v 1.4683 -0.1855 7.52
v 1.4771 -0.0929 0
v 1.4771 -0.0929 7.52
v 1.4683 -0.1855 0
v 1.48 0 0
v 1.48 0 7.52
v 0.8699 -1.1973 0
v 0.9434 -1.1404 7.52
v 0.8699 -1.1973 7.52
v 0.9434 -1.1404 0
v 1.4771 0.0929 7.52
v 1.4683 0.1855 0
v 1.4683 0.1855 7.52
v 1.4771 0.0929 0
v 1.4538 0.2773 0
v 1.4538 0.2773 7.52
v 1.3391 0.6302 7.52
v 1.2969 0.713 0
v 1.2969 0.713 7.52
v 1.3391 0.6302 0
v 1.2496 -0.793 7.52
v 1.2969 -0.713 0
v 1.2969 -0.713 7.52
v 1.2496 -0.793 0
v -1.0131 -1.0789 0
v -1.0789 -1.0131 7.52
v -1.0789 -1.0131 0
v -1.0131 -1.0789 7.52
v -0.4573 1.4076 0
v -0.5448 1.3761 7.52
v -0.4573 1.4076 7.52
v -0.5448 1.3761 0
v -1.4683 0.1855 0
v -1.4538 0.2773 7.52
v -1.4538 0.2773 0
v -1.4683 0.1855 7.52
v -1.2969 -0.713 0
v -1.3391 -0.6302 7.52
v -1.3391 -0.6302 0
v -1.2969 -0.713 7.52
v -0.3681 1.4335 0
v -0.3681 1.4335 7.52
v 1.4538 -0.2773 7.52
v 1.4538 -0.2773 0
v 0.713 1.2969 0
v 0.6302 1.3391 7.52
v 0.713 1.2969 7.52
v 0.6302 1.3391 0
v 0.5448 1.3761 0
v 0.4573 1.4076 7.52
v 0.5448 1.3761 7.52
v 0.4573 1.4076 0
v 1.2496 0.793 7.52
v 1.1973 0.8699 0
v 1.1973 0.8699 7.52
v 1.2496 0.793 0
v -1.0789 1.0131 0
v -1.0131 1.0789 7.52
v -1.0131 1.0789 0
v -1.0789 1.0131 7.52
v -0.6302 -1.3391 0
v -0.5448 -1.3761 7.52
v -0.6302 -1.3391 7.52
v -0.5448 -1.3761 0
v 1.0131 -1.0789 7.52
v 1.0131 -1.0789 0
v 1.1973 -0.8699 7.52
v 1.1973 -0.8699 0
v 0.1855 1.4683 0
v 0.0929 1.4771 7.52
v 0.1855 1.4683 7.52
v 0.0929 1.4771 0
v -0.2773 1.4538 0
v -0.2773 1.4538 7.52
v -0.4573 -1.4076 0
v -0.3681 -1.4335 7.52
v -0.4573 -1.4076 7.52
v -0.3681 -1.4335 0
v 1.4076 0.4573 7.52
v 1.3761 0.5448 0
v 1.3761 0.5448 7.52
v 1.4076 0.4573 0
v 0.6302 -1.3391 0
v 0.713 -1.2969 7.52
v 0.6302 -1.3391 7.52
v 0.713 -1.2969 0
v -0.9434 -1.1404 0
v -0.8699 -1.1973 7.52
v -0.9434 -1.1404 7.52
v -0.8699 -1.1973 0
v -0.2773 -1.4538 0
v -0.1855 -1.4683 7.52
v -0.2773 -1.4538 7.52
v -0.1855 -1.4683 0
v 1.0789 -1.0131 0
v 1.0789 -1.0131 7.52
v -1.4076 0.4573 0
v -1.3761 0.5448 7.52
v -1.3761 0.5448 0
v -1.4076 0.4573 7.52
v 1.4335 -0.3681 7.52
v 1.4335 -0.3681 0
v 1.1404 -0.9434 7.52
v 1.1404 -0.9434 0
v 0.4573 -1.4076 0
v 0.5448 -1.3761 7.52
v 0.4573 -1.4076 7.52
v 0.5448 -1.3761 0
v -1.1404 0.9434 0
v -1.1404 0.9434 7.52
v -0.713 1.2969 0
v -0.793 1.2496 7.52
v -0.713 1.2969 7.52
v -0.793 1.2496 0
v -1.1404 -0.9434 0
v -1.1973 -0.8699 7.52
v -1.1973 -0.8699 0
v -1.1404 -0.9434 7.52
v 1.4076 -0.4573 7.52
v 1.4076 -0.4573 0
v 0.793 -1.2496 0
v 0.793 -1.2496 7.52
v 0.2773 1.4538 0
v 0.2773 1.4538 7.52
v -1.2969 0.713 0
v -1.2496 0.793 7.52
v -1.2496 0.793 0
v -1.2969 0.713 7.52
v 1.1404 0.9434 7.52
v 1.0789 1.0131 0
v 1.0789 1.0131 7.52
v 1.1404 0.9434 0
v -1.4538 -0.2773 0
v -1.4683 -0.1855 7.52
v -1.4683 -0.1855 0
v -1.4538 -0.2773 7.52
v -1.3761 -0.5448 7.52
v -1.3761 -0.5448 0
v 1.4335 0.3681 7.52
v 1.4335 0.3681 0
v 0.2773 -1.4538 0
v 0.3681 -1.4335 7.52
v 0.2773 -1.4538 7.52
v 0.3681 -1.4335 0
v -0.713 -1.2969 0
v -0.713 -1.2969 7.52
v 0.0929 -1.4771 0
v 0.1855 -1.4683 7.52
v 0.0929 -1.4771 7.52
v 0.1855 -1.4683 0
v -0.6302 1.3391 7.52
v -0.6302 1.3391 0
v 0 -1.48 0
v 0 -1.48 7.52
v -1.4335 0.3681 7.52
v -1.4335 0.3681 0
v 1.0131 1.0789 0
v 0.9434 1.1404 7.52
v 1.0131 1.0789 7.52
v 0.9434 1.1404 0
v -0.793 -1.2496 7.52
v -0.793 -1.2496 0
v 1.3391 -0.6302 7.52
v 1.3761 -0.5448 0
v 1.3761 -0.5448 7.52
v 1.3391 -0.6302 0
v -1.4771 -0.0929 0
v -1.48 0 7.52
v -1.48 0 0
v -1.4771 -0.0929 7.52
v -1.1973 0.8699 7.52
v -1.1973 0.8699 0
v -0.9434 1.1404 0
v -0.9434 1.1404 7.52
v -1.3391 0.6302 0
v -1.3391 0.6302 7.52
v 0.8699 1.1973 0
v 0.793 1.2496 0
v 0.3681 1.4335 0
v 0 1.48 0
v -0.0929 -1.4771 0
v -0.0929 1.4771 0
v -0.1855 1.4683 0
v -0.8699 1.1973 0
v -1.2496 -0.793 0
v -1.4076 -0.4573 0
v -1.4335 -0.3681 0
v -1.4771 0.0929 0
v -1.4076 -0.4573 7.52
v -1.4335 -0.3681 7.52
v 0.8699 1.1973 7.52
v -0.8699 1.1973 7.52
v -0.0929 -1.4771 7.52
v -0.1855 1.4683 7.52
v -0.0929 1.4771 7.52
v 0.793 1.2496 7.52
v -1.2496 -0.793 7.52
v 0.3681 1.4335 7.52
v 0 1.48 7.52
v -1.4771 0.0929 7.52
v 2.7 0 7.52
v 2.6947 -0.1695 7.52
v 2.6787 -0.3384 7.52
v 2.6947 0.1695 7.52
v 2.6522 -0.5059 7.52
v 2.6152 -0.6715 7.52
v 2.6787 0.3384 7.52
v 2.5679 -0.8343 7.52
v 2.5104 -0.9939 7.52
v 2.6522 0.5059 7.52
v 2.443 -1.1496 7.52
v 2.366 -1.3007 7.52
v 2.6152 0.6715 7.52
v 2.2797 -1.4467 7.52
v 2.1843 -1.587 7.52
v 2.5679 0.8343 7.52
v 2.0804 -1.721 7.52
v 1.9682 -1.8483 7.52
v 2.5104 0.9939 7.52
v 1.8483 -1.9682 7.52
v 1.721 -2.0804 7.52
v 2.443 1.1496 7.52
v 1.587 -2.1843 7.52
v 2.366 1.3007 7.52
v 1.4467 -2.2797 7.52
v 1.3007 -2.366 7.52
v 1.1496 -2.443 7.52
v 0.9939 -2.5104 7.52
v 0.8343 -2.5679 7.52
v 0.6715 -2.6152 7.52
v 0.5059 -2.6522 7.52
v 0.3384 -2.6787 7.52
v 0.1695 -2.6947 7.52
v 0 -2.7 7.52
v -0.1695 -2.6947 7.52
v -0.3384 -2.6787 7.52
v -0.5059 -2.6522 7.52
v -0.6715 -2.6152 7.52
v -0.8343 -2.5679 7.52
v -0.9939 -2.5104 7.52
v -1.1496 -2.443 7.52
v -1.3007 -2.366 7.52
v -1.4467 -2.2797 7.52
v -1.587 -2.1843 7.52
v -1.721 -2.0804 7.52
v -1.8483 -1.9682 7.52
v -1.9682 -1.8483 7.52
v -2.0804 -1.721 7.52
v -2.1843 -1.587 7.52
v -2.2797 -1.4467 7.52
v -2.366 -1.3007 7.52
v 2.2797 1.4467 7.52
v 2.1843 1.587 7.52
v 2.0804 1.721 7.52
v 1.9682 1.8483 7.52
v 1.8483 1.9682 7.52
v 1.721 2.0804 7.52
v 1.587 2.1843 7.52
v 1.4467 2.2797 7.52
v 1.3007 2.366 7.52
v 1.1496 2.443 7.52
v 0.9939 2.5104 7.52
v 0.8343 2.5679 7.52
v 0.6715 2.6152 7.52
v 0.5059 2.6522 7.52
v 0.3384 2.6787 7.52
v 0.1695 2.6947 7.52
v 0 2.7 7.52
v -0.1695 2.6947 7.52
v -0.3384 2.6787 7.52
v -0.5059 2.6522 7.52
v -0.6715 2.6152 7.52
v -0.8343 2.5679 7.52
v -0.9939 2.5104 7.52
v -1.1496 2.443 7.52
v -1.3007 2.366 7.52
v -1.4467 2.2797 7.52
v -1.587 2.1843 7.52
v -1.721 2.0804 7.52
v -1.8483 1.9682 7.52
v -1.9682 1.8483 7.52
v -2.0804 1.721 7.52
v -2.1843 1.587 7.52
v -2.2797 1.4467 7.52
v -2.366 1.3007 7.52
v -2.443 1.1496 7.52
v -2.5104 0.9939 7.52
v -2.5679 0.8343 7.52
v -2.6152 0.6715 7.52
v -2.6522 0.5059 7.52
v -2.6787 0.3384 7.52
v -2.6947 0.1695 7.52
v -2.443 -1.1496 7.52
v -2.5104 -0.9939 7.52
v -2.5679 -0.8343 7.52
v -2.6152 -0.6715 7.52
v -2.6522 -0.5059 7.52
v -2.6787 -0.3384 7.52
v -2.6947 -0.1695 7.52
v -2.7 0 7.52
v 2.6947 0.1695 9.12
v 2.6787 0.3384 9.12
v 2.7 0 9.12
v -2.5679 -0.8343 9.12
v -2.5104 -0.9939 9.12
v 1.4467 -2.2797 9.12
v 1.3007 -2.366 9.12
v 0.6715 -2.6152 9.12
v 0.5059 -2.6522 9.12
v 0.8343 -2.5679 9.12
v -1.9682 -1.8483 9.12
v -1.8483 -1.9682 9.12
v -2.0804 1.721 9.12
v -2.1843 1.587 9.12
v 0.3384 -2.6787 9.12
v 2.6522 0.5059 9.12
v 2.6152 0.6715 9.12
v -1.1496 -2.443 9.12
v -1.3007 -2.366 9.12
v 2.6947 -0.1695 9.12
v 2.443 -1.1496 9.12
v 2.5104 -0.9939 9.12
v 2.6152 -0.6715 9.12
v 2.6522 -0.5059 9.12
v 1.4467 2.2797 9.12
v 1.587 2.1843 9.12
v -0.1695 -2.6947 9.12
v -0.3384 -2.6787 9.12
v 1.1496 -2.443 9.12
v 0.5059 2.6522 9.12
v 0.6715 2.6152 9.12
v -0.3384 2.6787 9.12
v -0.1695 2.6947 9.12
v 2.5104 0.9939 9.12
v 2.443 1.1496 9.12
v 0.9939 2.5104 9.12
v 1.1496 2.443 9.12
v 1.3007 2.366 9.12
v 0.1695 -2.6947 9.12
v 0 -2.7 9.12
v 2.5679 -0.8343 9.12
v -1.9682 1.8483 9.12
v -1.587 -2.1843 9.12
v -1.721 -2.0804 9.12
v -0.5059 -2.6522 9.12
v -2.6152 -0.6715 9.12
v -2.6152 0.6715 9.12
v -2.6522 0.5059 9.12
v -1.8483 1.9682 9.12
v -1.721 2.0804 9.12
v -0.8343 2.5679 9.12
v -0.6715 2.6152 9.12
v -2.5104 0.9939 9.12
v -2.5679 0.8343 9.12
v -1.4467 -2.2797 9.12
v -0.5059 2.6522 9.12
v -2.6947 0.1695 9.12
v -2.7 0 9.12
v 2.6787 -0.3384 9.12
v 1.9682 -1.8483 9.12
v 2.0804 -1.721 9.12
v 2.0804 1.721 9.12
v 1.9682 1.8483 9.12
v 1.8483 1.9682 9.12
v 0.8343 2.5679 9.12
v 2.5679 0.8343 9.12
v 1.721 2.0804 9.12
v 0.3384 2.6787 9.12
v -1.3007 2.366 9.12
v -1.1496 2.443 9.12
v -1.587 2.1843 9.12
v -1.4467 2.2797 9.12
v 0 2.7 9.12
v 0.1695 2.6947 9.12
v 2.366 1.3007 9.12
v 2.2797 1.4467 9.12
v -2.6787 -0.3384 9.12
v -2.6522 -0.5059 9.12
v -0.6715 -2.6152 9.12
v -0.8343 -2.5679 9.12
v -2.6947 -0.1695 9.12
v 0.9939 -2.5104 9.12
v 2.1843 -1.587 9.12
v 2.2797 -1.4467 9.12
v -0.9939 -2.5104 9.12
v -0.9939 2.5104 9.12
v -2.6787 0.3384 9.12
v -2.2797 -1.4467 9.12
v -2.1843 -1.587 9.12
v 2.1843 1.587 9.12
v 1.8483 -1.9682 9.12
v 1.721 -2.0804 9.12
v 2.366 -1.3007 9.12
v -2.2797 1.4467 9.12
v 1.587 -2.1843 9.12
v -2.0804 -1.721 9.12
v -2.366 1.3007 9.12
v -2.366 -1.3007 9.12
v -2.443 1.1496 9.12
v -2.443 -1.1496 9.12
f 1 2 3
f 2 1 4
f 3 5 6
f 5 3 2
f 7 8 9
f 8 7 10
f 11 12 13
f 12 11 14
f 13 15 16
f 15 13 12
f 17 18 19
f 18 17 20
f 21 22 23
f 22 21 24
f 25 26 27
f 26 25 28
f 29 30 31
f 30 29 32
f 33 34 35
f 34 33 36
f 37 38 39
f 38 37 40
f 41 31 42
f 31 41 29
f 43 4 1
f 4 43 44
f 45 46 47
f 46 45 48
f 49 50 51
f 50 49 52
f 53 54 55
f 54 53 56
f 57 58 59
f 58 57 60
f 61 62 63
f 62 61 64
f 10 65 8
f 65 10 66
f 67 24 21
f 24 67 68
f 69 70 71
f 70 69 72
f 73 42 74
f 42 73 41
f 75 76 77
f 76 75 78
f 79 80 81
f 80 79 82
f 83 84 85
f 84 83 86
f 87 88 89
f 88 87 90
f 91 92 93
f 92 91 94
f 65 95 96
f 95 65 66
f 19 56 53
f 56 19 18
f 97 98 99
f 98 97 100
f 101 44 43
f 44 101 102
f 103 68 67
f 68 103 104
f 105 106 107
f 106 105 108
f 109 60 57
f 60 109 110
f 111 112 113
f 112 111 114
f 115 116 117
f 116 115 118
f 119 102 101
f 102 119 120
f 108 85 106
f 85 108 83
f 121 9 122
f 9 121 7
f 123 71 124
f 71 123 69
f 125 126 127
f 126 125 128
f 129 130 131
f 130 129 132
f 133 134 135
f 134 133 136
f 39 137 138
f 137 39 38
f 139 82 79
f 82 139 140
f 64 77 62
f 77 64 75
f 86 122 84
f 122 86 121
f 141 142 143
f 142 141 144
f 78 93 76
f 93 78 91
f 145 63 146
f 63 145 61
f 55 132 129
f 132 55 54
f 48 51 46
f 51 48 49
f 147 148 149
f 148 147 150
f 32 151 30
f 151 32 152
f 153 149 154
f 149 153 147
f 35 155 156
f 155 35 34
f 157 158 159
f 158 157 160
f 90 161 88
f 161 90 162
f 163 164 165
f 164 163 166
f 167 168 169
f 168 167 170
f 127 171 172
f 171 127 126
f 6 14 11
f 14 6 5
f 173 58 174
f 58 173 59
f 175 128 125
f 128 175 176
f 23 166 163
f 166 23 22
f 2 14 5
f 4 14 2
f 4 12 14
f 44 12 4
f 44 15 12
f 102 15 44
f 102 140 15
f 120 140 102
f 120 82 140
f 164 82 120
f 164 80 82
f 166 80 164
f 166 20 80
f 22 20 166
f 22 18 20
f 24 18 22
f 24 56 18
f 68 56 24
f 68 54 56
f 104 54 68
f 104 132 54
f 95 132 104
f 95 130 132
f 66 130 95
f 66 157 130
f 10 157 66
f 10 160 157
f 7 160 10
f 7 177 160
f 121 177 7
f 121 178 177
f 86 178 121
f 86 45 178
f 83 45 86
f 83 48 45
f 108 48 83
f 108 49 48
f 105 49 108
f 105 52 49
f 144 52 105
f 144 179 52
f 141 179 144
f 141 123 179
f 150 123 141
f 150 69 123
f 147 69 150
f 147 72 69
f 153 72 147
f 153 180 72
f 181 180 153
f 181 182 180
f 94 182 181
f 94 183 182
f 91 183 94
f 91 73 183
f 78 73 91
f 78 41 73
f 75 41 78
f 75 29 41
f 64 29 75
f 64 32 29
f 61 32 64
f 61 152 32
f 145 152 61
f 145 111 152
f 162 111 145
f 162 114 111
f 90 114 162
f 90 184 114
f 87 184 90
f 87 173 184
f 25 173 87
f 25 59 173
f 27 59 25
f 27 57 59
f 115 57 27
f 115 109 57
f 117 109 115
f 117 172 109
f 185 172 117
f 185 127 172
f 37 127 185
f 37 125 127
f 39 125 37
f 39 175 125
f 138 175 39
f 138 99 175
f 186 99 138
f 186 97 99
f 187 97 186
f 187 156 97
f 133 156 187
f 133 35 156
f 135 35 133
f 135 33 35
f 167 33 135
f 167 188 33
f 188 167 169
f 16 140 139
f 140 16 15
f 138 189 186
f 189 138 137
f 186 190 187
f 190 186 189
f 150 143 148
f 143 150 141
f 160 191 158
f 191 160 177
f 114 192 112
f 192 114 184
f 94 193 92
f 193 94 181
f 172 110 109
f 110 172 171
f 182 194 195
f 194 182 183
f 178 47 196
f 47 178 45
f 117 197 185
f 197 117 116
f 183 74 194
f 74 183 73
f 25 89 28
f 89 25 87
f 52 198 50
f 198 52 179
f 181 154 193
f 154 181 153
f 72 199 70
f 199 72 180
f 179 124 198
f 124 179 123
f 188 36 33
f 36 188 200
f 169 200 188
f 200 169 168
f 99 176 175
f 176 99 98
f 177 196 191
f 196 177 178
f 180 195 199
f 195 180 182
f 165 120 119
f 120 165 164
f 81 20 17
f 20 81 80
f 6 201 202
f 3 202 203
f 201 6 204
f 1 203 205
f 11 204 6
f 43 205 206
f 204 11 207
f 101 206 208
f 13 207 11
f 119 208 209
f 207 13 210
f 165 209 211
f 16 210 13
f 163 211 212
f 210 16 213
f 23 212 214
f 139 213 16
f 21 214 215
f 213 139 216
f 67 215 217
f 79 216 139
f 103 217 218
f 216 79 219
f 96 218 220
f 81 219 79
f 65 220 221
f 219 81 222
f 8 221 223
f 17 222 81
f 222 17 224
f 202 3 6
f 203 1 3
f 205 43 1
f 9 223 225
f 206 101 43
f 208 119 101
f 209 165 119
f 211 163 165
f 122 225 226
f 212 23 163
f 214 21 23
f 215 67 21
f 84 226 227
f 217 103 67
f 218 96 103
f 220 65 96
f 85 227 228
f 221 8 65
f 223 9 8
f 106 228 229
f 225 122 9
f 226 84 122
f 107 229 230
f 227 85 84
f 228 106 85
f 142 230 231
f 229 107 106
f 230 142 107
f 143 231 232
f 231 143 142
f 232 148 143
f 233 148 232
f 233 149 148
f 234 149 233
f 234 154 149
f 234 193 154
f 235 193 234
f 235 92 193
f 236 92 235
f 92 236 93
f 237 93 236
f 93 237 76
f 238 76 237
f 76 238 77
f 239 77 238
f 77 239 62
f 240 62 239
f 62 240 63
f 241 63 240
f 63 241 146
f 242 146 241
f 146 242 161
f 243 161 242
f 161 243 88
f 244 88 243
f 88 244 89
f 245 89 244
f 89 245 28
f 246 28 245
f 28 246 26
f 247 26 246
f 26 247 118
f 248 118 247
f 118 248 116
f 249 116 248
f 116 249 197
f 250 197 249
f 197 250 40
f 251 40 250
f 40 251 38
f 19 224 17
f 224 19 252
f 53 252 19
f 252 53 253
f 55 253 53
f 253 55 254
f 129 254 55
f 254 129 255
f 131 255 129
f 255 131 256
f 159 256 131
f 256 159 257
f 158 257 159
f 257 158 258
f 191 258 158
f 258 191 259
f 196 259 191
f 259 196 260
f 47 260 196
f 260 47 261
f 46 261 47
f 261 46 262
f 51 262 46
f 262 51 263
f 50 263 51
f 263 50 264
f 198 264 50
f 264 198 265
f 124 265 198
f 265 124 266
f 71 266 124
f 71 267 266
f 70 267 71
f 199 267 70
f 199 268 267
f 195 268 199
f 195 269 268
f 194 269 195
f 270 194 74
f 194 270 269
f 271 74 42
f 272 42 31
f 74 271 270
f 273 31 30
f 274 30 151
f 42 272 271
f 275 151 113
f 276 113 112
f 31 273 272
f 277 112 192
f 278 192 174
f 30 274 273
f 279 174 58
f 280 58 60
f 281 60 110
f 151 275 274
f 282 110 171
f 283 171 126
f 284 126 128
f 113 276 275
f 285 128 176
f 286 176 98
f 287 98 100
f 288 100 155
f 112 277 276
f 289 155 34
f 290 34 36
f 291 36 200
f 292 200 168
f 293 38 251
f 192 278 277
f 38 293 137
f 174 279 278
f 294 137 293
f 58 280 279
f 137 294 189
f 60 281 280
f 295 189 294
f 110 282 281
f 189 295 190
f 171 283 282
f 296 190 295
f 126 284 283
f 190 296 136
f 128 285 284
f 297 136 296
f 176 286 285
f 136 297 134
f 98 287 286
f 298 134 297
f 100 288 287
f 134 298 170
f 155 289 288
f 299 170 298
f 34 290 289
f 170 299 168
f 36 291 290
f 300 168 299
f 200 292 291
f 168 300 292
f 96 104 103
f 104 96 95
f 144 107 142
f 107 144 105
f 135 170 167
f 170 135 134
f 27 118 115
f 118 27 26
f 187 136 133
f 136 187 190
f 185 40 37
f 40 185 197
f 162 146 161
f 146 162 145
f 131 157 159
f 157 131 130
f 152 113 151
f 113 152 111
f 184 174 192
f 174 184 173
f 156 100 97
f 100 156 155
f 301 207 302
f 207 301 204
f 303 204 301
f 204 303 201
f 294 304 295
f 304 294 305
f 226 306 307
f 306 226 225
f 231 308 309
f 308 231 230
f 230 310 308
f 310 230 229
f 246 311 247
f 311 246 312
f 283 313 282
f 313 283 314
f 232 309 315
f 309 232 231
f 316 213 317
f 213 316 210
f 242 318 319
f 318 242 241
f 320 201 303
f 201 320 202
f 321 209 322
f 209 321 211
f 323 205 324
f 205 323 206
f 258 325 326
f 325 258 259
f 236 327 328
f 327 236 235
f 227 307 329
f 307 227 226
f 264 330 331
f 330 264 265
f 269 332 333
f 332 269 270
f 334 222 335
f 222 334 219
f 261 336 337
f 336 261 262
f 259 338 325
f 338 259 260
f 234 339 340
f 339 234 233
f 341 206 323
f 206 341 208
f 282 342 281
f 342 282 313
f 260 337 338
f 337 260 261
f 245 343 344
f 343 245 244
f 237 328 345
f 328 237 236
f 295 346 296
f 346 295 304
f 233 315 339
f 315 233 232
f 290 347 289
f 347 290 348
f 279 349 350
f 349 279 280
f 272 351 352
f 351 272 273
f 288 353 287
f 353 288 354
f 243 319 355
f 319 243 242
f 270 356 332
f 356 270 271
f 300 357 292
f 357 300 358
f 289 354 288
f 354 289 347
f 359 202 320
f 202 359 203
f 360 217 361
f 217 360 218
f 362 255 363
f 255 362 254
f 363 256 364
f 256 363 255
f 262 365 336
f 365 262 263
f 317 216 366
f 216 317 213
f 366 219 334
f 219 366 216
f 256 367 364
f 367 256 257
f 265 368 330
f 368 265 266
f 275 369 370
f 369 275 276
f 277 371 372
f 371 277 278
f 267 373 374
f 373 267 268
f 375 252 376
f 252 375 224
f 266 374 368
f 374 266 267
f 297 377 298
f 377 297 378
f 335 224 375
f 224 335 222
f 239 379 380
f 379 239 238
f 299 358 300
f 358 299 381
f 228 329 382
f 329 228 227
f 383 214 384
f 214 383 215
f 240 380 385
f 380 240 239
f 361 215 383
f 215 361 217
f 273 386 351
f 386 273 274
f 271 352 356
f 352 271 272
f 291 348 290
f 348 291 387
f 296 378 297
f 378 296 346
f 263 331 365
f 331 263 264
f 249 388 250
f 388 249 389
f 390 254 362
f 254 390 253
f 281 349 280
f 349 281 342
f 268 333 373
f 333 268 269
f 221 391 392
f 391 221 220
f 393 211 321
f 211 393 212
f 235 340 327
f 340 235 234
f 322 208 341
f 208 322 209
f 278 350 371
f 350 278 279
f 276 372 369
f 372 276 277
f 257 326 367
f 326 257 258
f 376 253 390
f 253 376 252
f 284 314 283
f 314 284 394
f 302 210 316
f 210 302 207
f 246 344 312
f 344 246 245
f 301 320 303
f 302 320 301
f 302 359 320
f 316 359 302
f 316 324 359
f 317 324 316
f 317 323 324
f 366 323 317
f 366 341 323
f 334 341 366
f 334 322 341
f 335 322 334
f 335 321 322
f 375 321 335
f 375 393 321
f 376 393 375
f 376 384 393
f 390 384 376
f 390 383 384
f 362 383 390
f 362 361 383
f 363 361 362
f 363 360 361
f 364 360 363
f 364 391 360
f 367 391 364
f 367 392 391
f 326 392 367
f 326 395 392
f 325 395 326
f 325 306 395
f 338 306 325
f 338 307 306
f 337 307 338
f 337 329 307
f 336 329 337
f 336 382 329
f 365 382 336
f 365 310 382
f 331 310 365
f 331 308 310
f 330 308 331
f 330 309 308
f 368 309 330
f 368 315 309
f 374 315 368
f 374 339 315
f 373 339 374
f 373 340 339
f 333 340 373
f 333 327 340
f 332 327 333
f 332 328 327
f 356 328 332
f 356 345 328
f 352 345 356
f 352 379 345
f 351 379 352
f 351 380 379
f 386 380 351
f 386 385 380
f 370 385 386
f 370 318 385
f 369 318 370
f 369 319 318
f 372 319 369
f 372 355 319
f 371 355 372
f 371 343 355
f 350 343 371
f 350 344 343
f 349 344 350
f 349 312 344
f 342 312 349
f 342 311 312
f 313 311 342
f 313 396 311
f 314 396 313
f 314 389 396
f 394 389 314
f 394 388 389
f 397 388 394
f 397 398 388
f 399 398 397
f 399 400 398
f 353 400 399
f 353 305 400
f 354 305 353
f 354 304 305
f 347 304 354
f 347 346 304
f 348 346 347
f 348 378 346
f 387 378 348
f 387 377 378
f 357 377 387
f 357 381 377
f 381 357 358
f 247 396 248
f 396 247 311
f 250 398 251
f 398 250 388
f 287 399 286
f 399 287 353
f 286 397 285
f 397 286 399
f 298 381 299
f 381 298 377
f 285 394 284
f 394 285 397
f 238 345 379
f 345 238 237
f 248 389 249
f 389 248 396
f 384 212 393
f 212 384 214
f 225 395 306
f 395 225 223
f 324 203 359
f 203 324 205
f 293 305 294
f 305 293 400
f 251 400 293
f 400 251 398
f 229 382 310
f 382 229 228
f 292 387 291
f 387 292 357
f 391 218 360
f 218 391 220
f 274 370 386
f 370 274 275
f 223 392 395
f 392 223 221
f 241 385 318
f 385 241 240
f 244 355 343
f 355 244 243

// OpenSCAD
include <../Household/references.scad>
screw("m3",type_of_dimension="IS");
